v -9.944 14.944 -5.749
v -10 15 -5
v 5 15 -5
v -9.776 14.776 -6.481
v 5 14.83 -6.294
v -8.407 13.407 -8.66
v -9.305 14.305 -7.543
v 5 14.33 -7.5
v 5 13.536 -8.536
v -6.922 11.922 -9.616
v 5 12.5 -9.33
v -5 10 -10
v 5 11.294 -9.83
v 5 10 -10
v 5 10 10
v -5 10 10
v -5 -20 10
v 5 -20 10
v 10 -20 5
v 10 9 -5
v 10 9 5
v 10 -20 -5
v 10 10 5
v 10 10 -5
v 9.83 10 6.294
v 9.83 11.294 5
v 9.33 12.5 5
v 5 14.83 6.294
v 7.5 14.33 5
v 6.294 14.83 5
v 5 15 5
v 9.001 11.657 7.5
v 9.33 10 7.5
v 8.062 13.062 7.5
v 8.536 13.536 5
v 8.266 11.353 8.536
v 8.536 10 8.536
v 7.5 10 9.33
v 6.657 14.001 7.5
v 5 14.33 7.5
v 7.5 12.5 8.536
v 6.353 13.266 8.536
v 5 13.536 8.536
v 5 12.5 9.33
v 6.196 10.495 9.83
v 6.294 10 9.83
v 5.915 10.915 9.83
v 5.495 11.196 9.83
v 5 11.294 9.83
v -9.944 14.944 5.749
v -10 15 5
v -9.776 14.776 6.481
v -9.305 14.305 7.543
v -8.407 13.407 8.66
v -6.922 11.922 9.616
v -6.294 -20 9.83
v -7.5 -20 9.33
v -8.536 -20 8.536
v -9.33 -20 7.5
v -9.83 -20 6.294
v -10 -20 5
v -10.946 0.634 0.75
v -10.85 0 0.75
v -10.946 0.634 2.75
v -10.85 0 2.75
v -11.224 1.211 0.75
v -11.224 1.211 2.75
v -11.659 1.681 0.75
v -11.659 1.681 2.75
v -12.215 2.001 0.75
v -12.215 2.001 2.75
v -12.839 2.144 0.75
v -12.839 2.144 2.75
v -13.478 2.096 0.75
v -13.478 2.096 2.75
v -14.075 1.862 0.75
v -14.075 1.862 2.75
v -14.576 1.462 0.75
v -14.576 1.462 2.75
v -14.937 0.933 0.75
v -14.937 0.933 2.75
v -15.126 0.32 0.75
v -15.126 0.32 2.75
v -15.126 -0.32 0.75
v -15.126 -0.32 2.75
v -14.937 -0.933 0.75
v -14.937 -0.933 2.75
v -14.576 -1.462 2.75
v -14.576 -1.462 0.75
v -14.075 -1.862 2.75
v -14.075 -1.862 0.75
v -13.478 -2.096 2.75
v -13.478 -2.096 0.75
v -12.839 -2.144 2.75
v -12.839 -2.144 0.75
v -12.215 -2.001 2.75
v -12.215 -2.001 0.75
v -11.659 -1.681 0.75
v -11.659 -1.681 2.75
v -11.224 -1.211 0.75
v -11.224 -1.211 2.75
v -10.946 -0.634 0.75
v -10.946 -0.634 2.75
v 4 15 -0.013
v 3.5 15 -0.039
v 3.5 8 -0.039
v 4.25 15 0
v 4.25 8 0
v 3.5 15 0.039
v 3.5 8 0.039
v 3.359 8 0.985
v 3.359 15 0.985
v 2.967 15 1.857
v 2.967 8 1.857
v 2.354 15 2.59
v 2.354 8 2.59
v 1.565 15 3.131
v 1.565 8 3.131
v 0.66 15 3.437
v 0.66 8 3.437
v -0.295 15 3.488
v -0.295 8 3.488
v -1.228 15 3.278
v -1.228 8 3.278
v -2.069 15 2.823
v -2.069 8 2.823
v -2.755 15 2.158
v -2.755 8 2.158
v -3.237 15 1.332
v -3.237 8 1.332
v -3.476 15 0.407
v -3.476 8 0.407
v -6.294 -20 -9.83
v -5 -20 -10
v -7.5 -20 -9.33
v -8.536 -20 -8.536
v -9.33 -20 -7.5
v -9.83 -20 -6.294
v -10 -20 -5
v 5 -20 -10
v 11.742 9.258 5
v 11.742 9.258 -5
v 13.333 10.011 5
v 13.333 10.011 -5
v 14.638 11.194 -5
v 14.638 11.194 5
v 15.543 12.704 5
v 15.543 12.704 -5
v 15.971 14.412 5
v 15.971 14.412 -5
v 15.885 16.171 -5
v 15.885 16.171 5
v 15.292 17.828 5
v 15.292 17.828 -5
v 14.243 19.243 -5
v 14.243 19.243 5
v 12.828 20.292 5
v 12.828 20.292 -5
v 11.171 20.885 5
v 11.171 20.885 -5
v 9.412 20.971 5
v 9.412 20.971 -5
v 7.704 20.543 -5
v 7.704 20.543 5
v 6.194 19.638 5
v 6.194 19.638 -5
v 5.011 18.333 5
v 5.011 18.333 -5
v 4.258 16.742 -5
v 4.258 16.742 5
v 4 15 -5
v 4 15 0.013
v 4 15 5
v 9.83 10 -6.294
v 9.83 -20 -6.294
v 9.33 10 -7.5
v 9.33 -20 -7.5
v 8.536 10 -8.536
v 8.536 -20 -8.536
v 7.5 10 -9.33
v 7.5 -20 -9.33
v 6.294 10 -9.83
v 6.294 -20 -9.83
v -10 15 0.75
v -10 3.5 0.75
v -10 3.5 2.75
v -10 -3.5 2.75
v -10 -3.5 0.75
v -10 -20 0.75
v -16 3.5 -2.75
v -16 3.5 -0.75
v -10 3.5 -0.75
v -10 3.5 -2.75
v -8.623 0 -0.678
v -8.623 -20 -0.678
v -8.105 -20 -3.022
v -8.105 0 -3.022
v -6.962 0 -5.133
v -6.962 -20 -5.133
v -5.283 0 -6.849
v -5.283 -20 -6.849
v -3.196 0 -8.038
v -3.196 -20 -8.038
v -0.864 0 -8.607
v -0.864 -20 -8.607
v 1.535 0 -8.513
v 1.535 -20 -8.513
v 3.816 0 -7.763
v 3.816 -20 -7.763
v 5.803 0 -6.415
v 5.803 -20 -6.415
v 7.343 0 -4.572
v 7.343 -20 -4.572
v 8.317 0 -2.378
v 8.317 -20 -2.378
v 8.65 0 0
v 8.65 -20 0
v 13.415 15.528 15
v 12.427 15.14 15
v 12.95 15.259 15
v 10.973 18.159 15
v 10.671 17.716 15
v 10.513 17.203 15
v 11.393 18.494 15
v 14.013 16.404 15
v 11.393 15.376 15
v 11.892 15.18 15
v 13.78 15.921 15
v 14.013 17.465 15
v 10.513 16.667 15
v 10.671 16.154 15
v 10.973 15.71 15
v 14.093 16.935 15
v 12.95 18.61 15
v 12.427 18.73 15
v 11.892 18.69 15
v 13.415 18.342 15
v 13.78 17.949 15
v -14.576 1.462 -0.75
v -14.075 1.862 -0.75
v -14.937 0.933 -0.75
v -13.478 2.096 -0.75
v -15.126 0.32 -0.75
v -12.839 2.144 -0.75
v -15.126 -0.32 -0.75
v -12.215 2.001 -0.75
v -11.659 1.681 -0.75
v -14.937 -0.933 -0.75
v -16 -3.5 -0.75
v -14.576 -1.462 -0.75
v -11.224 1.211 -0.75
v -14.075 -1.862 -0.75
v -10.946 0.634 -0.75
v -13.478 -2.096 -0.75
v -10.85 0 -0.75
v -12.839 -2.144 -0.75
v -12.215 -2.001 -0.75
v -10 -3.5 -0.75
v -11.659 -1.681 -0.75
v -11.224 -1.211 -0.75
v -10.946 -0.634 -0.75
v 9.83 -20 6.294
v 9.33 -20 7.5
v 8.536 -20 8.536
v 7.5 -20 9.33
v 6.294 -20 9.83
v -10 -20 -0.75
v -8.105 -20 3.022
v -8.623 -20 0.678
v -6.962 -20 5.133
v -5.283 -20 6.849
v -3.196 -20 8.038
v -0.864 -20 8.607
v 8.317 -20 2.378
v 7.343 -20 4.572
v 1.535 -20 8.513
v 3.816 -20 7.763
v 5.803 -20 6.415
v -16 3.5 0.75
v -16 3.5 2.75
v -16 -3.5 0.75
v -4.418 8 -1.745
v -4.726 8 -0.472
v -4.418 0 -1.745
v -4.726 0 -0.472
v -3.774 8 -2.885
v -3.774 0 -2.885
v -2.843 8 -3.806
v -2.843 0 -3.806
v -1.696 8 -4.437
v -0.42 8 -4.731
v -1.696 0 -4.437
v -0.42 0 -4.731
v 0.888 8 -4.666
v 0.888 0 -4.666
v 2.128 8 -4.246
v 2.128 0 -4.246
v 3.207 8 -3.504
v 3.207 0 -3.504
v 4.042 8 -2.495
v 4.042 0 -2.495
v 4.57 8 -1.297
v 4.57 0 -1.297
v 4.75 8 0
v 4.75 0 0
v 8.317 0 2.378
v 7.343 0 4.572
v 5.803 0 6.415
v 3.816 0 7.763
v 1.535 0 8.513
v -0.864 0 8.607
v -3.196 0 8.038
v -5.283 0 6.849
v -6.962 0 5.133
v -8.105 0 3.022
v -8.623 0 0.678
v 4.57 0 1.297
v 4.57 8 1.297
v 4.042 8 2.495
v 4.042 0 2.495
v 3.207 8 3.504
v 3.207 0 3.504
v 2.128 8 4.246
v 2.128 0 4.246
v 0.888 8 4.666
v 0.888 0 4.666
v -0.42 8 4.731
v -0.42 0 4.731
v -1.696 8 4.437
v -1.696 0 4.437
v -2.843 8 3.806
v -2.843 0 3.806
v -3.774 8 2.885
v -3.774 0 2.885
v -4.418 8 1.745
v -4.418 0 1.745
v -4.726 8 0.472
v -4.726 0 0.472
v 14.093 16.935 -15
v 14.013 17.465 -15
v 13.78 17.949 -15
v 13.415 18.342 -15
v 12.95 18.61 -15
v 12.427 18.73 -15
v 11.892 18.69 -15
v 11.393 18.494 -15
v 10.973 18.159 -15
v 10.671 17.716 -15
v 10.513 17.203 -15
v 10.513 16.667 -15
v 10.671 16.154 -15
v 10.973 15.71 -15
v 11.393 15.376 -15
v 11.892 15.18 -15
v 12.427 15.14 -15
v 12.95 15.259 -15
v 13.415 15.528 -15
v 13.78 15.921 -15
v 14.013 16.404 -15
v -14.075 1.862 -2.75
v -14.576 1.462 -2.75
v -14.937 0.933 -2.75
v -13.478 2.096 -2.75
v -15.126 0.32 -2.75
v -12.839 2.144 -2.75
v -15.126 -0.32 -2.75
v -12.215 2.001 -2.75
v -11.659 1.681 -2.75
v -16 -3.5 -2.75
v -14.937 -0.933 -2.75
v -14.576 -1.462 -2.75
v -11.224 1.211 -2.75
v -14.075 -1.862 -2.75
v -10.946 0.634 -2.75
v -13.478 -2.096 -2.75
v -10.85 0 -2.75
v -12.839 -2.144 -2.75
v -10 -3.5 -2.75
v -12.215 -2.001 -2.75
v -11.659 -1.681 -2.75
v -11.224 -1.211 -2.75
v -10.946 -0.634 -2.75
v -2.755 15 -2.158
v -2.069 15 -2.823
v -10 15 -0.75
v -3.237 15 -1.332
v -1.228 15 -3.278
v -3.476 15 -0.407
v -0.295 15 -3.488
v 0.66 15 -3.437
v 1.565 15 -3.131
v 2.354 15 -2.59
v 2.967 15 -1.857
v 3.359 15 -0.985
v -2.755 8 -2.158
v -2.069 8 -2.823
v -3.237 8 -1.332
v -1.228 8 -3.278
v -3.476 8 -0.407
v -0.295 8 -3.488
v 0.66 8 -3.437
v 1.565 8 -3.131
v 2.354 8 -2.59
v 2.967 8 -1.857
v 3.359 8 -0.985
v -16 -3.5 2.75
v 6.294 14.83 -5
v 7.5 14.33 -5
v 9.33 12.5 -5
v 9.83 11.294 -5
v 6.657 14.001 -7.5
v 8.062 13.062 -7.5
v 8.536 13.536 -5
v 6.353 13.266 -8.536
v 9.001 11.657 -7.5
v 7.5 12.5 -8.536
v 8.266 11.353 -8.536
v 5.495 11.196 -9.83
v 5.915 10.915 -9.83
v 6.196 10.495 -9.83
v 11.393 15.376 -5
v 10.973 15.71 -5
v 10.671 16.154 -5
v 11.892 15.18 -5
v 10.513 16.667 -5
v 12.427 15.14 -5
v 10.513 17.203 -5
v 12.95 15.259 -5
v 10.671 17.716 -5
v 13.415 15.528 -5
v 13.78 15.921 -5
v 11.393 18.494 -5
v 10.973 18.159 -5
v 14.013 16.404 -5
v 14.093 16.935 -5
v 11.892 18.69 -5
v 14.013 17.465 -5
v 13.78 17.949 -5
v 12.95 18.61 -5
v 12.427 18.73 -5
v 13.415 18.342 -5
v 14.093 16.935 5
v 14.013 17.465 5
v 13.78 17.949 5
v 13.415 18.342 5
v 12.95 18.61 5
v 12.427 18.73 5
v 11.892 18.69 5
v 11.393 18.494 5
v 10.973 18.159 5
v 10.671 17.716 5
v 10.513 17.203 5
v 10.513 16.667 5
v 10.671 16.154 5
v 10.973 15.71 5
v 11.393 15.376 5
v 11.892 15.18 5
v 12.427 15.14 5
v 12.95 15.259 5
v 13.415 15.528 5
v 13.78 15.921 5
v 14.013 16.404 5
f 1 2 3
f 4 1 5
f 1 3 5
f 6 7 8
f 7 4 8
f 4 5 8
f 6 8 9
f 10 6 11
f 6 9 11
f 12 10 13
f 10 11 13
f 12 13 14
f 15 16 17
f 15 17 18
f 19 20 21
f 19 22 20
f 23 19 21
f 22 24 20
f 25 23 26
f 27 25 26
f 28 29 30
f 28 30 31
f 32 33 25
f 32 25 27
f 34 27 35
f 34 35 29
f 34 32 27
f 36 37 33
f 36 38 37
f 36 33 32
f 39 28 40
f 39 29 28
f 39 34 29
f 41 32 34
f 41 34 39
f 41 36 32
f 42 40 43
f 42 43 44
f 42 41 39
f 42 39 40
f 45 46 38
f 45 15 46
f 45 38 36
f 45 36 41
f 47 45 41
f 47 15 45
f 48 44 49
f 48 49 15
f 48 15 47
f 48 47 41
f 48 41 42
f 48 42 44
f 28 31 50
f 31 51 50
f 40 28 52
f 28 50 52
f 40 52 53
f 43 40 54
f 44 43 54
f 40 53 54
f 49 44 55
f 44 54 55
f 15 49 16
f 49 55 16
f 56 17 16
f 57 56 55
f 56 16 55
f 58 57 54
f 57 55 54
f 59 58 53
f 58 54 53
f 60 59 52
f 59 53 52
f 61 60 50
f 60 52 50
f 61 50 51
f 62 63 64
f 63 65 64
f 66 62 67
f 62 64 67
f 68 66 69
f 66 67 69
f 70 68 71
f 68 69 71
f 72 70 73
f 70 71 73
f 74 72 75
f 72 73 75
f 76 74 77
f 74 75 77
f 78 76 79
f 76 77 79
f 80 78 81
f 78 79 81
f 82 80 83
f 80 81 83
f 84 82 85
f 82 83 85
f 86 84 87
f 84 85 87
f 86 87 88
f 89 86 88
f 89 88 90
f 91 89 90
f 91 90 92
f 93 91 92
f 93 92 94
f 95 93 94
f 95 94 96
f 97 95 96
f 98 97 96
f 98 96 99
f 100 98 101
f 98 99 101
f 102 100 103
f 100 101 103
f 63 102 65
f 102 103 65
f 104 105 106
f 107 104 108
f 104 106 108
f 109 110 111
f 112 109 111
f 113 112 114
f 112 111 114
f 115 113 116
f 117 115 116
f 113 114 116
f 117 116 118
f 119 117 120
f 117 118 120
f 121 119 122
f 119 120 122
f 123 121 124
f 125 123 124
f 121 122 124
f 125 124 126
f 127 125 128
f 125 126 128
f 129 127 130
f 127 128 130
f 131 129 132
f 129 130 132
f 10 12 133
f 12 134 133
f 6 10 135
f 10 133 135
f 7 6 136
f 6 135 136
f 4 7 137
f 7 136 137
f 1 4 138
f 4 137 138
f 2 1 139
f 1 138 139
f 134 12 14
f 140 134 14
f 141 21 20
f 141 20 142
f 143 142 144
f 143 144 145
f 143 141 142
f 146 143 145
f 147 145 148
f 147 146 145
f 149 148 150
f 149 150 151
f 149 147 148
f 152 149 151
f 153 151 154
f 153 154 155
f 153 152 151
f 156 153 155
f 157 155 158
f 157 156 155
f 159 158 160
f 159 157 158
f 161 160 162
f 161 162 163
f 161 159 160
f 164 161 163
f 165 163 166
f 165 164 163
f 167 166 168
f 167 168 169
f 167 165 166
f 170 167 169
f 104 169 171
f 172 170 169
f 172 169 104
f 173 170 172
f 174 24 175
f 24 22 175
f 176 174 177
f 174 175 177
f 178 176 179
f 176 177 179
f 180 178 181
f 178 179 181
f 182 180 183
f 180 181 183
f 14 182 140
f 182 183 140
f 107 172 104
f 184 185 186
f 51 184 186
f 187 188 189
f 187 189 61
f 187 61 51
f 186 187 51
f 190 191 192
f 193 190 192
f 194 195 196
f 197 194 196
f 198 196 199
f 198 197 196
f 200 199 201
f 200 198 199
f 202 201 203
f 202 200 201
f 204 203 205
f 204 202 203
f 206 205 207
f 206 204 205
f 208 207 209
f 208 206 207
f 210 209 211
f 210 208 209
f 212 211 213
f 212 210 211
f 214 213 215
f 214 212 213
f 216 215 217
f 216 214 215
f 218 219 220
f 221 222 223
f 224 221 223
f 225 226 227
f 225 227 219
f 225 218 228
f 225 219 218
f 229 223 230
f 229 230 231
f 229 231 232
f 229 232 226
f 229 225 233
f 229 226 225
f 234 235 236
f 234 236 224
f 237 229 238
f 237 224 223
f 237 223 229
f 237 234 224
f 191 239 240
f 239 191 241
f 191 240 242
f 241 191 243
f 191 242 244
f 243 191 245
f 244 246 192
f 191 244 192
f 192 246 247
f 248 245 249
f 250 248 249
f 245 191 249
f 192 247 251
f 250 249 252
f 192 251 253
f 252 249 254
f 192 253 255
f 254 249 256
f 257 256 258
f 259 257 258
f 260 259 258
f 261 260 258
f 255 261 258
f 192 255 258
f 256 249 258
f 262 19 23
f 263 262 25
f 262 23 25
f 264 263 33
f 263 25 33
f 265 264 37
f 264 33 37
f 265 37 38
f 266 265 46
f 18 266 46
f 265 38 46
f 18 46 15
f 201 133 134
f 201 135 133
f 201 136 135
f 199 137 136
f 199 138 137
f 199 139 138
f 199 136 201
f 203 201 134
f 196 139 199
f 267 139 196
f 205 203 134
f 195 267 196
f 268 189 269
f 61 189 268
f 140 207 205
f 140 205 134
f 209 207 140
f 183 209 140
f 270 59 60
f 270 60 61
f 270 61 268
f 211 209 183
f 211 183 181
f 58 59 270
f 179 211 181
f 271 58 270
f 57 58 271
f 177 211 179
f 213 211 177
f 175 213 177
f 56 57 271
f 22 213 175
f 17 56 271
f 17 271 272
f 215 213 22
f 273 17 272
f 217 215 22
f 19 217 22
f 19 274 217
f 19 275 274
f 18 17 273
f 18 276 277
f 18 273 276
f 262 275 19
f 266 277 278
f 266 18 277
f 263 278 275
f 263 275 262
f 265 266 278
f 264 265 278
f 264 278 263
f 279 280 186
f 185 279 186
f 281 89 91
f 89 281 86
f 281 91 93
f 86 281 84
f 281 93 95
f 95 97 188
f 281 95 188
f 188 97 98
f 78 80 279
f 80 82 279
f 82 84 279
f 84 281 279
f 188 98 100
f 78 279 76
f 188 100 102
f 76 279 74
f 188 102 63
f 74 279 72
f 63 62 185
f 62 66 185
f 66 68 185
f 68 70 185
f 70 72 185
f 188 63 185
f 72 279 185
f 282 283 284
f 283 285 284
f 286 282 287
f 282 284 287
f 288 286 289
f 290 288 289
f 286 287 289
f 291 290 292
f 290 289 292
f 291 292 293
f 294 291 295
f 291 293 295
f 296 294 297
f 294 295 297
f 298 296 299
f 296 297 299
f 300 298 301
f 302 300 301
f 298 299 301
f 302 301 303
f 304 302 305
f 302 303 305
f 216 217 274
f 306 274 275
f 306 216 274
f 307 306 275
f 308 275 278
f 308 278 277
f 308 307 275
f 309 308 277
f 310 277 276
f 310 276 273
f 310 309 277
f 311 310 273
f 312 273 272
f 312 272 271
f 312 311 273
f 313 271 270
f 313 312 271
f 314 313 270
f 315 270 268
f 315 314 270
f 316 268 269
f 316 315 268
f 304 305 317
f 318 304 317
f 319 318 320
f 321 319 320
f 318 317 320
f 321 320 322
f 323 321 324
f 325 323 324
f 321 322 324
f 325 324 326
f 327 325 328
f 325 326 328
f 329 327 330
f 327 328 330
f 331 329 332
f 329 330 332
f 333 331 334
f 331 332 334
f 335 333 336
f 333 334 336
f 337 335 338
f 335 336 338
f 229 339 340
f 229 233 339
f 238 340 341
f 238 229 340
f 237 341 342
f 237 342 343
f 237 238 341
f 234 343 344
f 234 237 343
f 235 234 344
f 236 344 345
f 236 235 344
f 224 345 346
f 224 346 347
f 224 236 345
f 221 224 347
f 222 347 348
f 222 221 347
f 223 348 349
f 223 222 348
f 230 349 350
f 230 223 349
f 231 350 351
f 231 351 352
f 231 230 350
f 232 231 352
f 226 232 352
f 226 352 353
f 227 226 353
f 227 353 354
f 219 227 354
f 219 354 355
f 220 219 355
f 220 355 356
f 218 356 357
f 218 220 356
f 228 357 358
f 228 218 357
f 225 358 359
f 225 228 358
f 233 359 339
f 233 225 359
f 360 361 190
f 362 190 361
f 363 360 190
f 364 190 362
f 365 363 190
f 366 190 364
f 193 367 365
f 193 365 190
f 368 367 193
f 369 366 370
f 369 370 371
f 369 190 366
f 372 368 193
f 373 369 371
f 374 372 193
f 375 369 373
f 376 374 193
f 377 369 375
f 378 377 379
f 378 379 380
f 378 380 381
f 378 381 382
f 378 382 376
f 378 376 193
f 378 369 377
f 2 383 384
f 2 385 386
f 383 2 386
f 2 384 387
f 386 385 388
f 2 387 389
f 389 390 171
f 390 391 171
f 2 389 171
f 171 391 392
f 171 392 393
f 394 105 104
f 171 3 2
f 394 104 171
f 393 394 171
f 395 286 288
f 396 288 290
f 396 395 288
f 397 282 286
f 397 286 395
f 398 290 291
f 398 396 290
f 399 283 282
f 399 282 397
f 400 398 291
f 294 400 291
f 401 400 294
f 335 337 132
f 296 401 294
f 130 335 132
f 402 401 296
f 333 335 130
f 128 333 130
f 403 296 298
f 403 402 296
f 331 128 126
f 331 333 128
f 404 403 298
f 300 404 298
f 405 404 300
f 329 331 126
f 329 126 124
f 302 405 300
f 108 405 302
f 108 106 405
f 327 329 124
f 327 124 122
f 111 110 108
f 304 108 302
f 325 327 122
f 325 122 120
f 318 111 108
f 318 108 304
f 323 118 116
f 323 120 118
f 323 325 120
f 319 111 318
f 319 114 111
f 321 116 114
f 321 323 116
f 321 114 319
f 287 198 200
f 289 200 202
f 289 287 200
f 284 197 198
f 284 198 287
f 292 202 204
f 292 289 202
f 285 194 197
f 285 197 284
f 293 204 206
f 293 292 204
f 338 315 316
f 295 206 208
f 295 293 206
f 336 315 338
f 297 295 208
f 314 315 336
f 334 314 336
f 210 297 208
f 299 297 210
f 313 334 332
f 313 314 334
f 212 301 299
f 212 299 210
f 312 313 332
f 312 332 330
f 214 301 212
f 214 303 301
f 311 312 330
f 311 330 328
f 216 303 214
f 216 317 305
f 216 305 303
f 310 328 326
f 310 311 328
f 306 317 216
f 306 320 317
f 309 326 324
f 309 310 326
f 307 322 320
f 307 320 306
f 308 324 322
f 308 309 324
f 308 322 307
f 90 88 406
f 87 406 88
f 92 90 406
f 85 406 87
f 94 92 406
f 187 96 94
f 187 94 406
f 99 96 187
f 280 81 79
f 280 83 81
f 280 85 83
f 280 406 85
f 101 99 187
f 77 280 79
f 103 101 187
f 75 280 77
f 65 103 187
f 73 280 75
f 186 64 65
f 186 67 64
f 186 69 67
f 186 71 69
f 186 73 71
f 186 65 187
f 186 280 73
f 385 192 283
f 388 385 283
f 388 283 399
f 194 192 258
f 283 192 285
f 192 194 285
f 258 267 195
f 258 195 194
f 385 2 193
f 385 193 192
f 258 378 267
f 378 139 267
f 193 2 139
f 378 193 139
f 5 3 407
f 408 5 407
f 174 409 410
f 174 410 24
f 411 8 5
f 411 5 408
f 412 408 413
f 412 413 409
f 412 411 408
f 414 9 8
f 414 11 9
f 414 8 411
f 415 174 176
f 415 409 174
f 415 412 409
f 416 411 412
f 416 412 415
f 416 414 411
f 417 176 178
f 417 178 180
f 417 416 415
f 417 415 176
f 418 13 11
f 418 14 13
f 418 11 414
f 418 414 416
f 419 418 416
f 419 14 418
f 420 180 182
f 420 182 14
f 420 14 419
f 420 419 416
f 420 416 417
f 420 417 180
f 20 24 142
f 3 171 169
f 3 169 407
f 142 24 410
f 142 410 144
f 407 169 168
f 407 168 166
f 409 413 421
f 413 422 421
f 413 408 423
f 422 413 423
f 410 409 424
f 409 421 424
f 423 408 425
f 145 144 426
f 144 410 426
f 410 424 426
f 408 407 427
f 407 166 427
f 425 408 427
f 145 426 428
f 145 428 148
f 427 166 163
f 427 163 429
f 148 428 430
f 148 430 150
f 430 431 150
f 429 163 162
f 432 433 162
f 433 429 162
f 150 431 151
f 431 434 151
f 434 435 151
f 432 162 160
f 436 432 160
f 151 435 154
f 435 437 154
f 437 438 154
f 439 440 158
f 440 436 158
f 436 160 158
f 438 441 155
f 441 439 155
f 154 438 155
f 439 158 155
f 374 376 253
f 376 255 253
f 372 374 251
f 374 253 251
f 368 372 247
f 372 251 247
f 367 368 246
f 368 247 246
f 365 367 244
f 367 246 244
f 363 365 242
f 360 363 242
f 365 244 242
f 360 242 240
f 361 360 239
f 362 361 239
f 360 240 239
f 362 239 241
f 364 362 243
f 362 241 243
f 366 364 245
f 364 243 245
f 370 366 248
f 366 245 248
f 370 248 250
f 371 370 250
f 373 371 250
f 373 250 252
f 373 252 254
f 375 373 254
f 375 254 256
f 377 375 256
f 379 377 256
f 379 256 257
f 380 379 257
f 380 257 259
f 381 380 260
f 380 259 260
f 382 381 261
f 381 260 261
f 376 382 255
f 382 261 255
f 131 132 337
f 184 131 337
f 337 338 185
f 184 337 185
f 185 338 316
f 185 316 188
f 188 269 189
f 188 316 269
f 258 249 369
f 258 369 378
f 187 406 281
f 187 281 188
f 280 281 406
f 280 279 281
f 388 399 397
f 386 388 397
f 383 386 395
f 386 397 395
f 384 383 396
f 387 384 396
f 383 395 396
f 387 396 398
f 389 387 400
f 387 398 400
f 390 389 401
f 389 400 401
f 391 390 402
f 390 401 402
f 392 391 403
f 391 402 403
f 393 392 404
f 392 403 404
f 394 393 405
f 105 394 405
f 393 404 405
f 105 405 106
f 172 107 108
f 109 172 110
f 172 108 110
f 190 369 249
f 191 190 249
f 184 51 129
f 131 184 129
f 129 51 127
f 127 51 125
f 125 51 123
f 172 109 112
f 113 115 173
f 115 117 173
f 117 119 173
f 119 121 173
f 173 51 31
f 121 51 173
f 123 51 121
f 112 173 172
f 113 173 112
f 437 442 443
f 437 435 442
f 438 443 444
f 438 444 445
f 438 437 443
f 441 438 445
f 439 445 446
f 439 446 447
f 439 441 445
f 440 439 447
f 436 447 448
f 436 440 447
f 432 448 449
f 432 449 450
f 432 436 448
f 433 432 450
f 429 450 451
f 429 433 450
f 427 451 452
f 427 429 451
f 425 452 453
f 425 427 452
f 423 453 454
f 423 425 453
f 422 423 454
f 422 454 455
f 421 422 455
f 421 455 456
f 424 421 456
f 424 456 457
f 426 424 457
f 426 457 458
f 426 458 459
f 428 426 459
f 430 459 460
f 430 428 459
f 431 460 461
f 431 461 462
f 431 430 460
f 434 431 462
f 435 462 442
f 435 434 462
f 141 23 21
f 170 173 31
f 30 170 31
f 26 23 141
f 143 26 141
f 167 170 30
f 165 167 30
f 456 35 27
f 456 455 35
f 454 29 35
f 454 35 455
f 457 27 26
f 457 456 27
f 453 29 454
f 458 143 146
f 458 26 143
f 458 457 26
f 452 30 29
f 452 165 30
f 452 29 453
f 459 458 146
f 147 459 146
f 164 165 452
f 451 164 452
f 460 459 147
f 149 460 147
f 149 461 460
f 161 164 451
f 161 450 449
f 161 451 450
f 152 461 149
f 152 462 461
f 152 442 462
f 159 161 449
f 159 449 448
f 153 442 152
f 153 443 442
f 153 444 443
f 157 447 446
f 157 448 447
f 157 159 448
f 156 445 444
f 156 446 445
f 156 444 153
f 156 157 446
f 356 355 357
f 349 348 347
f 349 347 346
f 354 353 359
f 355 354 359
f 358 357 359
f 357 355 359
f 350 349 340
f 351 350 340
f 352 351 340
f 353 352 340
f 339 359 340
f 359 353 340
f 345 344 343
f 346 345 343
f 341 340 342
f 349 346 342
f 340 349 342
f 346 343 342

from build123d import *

# Parameters (mm, degrees)
F0_W      = 20
F0_H      = 20
F0_R      = 8.65
F1_DEPTH  = 20
F2_W      = 20
F2_H      = 20
F3_DEPTH  = 15
F4_R      = 4.75
F5_DEPTH  = 8
F6_R      = 2.075
F7_DEPTH  = 11
F9_DEPTH  = 25.3
F10_W     = 6
F10_H     = 2
F11_DEPTH = 3.5
F12_R     = 2.15
F13_DEPTH = 5.23
F14_R     = 1.65
F15_DEPTH = 6.34
F16_R     = 1.8
F17_DEPTH = 5
F18_R     = 5
F19_R     = 5
F20_R     = 4.99999
F21_R     = 3.5
F22_DEPTH = 31.8
F23_R     = 1.8
F24_DEPTH = 15


# Not quite as in the source:
# - a fillet or chamfer is up to 0.001 mm smaller than in the source, because OpenCascade refuses the exact size


with BuildPart() as f1:
    # F0 (on Front) → F1 (new body)
    with BuildSketch(Plane.XZ):
        Rectangle(F0_W, F0_H)
        Circle(F0_R, mode=Mode.SUBTRACT)
    extrude(amount=F1_DEPTH)

    # F2 (on Front) → F3 (join)
    with BuildSketch(Plane.XZ):
        Rectangle(F2_W, F2_H)
    extrude(amount=-F3_DEPTH)

    # F4 (on Front) → F5 (cut)
    with BuildSketch(Plane.XZ):
        Circle(F4_R)
    extrude(amount=-F5_DEPTH, mode=Mode.SUBTRACT)

    # F6 (on Front) → F7 (cut)
    with BuildSketch(Plane.XZ):
        Circle(F6_R)
    extrude(amount=-F7_DEPTH, mode=Mode.SUBTRACT)

    # F8 (on Front) → F9 (cut, symmetric)
    with BuildSketch(Plane.XZ):
        Polygon((4.25, 0), (-10, 0.75), (-10, -0.75), align=None)
    extrude(amount=F9_DEPTH, both=True, mode=Mode.SUBTRACT)

    # F10 (on Front) → F11 (join, symmetric)
    with BuildSketch(Plane.XZ):
        with Locations((-13, 1.75)):
            Rectangle(F10_W, F10_H)
        with Locations((-13, -1.75)):
            Rectangle(F10_W, F10_H)
    extrude(amount=F11_DEPTH, both=True)

    # F12 (on Top) → F13 (cut, symmetric)
    with BuildSketch(Plane.XY):
        with Locations((-13, 0)):
            Circle(F12_R)
    extrude(amount=F13_DEPTH, both=True, mode=Mode.SUBTRACT)

    # F14 (on Top) → F15 (cut)
    with BuildSketch(Plane.XY):
        with Locations((-13, 0)):
            Circle(F14_R)
    extrude(amount=-F15_DEPTH, mode=Mode.SUBTRACT)

    # F16 (on Top) → F17 (join, symmetric)
    with BuildSketch(Plane.XY):
        with BuildLine():
            Line((10, 15), (10, 9))
            ThreePointArc((10, 9), (14.2426406871, 19.2426406871), (4, 15))
            Line((4, 15), (10, 15))
        make_face()
        with Locations((12.2927147724, 16.93480205)):
            Circle(F16_R, mode=Mode.SUBTRACT)
    extrude(amount=F17_DEPTH, both=True)

    # F18
    f18_edges = [f1.edges().sort_by_distance(p)[0] for p in [
        (10, 15, 7.5),
    ]]
    fillet(f18_edges, radius=F18_R)

    # F19
    f19_edges = [f1.edges().sort_by_distance(p)[0] for p in [
        (10, 15, -7.5),
    ]]
    fillet(f19_edges, radius=F19_R)

    # F20 (radius 5 in the source; OpenCascade refuses exactly that, so slightly less here)
    f20_edges = [f1.edges().sort_by_distance(p)[0] for p in [
        (-10, -2.5, -10),
        (-10, -2.5, 10),
        (10, -5, -10),
        (10, -5, 10),
    ]]
    fillet(f20_edges, radius=F20_R)

    # F21 (on Front) → F22 (cut)
    with BuildSketch(Plane.XZ):
        Circle(F21_R)
    extrude(amount=-F22_DEPTH, mode=Mode.SUBTRACT)


with BuildPart() as f24:
    # F23 (on Top) → F24 (new body, symmetric)
    with BuildSketch(Plane.XY):
        with Locations((12.2927147724, 16.93480205)):
            Circle(F23_R)
    extrude(amount=F24_DEPTH, both=True)


solid = Compound([f1.part, f24.part])
